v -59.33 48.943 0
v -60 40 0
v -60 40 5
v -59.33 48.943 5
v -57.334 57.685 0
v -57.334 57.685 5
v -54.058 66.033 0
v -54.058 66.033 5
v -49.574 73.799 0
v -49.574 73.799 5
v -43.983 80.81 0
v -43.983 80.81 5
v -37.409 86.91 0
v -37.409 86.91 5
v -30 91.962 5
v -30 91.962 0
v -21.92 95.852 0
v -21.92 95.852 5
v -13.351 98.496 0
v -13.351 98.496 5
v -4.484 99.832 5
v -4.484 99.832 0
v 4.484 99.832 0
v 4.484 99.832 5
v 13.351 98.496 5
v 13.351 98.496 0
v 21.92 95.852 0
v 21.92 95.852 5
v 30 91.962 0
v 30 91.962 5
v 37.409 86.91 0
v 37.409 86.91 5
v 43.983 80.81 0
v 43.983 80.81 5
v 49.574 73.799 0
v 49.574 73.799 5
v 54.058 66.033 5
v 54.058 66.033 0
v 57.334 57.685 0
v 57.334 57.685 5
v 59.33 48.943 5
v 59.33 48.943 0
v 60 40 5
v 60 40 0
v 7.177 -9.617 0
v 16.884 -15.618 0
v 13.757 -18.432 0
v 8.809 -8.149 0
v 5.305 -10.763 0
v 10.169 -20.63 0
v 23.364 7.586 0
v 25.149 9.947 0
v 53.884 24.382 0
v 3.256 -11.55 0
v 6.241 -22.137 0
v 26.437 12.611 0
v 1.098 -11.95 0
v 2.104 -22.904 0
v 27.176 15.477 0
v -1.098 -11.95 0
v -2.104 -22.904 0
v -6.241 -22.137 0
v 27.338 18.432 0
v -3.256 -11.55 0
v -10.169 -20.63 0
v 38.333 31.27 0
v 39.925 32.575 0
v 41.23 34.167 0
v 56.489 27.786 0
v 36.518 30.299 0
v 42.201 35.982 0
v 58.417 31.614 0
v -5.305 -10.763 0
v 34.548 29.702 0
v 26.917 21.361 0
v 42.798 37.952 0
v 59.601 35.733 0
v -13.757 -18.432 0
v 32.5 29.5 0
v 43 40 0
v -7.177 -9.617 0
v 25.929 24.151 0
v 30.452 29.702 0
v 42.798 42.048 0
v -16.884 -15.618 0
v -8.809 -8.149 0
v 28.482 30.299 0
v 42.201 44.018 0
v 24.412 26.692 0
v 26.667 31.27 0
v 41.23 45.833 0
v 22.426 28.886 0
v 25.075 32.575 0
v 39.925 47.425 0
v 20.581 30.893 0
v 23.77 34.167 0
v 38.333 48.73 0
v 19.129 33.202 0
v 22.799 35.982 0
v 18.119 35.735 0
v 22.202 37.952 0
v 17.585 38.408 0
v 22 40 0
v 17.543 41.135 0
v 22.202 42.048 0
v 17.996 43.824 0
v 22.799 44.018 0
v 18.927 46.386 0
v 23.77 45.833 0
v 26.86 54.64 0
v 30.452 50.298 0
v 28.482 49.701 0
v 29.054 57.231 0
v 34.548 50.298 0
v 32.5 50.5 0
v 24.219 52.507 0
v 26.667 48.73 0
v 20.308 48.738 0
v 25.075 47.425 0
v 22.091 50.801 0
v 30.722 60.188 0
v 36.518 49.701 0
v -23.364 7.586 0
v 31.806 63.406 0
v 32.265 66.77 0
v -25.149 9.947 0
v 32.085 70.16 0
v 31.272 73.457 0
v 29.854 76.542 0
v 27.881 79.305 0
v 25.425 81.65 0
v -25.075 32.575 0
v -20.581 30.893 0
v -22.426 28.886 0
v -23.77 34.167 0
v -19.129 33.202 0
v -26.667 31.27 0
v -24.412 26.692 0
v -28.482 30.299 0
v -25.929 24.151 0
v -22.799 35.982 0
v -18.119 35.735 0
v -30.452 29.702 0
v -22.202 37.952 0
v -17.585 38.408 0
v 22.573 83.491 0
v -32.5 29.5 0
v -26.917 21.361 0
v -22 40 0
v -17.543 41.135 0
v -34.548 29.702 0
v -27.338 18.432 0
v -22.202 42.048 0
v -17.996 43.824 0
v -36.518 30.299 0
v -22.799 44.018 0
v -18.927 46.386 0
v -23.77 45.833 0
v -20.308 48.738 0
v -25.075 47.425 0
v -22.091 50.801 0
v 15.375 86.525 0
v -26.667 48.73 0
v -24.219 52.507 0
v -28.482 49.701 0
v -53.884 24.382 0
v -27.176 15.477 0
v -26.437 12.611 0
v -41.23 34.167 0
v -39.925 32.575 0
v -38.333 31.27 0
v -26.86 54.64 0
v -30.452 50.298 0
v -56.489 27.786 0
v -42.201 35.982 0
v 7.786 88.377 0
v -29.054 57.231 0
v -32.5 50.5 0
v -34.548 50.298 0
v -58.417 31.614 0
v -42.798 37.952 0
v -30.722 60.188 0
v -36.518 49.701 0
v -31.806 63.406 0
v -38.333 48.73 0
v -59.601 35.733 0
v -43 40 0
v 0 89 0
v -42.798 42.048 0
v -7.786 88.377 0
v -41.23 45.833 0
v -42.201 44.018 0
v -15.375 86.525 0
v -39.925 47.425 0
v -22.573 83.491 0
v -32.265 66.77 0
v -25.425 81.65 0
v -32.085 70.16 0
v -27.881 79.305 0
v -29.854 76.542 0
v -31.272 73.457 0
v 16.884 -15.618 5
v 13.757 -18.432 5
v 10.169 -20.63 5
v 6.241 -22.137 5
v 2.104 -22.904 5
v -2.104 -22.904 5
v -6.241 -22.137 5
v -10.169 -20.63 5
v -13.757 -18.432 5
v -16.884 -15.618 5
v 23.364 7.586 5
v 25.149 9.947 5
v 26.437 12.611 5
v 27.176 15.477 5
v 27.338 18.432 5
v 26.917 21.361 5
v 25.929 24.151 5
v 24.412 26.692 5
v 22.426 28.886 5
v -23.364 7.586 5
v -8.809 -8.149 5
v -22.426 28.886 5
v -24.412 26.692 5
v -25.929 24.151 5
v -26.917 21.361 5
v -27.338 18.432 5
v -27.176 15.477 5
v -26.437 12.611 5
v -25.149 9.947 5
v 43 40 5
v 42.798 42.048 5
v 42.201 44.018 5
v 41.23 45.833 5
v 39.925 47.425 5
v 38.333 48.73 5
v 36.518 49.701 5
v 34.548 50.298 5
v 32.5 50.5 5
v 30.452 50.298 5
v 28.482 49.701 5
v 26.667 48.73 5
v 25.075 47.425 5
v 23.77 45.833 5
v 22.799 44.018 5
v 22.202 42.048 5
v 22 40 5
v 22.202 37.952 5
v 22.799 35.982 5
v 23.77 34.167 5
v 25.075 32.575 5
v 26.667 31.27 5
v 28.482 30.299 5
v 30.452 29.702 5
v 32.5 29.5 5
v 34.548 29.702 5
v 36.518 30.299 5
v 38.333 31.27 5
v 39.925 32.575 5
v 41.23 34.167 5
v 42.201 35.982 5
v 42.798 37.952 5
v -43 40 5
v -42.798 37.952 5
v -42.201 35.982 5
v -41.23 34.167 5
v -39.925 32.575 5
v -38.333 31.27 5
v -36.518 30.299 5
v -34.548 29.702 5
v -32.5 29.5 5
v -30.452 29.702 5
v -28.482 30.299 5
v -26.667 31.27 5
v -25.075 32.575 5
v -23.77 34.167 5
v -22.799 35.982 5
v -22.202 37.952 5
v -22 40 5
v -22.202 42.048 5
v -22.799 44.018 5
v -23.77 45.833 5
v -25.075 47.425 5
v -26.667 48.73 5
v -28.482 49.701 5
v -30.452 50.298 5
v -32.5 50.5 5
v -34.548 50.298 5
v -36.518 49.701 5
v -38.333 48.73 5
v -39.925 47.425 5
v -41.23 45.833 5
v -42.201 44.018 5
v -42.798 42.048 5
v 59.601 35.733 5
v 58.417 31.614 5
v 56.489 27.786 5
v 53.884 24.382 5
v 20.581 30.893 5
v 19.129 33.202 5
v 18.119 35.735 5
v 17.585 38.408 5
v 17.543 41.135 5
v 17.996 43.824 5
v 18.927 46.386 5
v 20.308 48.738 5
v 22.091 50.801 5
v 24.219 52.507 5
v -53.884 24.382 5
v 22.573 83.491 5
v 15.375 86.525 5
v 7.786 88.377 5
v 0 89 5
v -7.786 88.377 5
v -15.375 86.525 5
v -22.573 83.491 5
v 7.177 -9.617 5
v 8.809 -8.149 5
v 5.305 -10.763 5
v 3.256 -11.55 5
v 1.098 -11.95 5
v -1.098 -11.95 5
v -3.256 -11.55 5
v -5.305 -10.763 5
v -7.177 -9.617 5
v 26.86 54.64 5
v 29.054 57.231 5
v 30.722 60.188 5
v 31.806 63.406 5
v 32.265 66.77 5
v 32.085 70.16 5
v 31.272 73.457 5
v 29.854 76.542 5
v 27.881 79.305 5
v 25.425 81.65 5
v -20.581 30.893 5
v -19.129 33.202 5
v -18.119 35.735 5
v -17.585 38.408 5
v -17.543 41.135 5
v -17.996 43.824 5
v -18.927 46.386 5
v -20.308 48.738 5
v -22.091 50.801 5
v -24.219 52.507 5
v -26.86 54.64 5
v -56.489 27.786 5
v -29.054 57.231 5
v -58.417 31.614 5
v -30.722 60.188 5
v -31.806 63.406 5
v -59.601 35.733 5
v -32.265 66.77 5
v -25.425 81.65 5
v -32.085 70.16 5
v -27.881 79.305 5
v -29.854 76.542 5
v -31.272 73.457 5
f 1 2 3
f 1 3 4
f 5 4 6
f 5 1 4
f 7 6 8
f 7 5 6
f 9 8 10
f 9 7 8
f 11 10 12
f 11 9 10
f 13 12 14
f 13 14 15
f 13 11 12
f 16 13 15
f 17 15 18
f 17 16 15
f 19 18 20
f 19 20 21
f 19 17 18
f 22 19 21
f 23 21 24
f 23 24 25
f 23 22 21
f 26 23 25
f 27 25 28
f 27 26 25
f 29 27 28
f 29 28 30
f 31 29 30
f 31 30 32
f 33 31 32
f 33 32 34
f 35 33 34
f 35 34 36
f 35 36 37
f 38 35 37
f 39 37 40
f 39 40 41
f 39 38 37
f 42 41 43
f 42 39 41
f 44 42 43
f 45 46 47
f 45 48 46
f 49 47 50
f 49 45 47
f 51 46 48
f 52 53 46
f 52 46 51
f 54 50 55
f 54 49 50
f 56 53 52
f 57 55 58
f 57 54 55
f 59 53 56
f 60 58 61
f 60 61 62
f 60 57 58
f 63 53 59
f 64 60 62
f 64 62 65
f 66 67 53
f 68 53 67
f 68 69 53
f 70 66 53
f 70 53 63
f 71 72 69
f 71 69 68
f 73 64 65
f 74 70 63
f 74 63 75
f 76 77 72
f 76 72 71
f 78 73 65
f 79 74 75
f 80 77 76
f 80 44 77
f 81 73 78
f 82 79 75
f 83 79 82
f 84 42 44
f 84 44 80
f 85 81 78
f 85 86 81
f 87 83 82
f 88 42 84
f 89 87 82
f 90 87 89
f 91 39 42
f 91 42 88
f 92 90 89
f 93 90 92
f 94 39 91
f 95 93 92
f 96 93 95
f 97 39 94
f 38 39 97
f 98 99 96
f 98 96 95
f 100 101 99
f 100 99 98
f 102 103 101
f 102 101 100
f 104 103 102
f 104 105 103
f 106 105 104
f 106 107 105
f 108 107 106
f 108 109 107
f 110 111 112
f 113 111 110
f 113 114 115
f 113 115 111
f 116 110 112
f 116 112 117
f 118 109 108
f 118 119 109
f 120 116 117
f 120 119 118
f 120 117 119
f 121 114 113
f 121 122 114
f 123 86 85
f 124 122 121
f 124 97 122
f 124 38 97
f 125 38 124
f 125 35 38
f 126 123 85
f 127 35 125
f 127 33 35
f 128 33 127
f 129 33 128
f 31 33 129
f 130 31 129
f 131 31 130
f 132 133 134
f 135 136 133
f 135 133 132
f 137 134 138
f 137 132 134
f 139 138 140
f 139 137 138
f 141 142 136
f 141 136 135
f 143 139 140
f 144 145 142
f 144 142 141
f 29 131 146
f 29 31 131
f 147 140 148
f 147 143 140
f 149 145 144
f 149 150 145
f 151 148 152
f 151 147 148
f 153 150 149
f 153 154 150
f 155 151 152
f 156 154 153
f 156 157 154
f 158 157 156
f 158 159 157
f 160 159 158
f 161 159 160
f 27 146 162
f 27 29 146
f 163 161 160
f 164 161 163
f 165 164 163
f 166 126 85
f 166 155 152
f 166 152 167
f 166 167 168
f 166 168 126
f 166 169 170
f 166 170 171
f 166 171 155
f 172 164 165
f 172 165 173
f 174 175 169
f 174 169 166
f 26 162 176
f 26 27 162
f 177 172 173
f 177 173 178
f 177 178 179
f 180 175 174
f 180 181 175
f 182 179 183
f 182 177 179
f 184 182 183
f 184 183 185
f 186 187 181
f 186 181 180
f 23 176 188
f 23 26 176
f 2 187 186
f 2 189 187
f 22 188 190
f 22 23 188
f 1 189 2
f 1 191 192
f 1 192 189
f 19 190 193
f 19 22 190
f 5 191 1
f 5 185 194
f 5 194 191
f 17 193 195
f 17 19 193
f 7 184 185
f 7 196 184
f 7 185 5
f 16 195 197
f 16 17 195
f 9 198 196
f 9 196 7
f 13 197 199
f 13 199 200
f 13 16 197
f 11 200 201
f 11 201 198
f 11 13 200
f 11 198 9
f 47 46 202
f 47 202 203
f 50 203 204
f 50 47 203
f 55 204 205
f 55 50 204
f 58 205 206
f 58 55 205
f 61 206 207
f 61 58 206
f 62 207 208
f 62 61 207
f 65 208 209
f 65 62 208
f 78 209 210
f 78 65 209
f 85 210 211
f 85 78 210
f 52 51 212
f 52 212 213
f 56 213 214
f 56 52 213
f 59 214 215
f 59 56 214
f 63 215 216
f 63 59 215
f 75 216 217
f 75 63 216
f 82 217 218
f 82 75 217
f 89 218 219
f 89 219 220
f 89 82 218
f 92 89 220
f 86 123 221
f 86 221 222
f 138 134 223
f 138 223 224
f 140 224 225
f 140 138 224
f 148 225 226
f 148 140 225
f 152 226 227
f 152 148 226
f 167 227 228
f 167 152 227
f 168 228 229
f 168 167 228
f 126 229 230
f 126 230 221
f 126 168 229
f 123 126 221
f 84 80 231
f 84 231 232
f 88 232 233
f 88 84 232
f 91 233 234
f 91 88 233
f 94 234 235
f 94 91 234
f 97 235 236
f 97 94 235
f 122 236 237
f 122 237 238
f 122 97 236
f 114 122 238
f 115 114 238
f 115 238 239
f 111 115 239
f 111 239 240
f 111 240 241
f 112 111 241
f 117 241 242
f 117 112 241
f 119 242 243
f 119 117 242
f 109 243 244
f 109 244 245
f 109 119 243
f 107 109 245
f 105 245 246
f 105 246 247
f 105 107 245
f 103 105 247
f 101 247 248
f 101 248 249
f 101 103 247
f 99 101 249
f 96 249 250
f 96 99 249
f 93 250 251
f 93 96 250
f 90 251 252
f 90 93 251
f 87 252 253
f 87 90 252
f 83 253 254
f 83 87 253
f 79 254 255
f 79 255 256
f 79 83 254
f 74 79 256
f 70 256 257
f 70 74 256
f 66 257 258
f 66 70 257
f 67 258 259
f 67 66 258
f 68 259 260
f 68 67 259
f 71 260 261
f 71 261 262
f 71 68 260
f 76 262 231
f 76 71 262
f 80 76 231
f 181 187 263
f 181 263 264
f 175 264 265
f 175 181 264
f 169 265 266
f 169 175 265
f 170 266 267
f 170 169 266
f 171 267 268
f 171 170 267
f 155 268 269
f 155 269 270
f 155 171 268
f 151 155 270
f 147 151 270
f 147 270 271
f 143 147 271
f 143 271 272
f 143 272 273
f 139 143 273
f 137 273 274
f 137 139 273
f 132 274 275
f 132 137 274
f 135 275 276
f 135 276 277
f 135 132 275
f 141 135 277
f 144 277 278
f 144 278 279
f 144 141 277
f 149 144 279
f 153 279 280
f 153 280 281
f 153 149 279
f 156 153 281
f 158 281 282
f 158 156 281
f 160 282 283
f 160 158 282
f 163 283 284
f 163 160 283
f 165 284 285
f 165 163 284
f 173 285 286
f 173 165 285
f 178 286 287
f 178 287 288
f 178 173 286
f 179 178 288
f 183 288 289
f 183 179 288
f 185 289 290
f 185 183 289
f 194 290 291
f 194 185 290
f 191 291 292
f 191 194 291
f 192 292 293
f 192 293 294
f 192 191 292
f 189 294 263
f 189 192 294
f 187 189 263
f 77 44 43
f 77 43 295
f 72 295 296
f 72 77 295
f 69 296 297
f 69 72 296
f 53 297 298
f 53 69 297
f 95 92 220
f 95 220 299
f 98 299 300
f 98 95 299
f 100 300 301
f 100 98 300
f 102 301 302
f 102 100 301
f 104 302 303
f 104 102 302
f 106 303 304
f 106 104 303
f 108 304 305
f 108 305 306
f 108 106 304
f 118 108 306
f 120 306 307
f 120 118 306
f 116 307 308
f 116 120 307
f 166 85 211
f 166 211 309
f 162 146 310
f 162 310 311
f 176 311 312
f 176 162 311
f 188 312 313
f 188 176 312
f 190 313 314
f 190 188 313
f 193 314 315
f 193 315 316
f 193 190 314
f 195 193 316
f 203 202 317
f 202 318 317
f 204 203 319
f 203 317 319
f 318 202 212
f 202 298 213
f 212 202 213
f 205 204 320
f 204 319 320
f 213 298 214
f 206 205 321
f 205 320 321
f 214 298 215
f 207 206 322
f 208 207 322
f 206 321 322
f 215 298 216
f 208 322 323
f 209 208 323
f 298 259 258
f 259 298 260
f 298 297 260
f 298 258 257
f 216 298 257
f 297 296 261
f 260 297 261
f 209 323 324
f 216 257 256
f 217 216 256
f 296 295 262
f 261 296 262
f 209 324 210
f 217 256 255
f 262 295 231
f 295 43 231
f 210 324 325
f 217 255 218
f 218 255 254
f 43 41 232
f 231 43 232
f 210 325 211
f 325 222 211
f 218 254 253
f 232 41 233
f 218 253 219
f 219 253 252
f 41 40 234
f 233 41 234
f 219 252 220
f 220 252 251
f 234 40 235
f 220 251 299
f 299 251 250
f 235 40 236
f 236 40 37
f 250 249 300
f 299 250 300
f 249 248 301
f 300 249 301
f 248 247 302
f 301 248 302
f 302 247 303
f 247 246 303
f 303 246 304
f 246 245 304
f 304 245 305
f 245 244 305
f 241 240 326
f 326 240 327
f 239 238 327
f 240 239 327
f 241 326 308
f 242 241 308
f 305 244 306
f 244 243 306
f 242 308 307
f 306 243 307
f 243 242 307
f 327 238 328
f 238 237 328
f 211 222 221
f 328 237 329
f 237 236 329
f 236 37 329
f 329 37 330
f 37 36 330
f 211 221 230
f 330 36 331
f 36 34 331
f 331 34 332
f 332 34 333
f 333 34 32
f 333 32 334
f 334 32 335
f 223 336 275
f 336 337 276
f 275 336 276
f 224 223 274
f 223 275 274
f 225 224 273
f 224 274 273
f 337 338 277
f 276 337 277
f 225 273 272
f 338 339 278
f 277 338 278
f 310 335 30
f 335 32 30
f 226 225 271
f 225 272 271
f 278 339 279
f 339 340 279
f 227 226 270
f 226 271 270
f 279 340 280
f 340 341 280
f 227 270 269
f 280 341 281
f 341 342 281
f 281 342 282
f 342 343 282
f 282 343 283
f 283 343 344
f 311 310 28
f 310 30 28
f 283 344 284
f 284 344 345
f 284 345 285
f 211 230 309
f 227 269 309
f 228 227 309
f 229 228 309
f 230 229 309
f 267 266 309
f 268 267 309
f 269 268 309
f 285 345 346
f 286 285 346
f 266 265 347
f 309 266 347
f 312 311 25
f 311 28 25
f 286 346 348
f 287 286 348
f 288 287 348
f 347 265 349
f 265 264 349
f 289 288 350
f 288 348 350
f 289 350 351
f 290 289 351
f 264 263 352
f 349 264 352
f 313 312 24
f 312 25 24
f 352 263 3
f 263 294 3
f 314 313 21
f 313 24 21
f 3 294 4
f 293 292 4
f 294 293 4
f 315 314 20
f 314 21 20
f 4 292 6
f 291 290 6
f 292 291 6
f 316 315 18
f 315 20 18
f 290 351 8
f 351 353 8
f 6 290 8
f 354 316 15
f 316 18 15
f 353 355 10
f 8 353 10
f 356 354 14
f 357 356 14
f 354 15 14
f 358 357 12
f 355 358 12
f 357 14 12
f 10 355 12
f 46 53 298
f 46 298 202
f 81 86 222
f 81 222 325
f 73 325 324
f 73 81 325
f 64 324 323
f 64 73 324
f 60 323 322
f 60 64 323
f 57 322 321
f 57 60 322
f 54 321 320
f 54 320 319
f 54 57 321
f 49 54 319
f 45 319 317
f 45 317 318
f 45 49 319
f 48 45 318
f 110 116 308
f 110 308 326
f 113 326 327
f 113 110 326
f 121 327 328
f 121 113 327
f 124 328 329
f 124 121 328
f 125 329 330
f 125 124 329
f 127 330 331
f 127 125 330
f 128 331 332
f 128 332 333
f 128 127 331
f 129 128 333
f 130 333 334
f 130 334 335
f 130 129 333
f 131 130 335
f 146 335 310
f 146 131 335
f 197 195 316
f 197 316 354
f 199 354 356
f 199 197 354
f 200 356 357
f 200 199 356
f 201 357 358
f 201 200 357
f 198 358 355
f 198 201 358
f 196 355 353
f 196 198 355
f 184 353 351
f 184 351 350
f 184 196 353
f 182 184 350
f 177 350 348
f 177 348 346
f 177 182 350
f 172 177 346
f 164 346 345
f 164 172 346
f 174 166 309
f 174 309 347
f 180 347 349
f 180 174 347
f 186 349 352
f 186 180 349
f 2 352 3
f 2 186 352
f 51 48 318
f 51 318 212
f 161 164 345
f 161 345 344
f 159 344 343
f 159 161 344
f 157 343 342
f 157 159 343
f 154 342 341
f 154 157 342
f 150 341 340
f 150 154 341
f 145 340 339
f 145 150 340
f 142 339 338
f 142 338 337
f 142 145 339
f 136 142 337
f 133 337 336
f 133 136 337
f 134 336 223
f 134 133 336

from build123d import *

# Parameters (mm, degrees)
SKETCH2_R           = 10.5
BOSS_EXTRUDE1_DEPTH = 5


with BuildPart() as part:
    # Sketch2 → Boss-Extrude1 (new body)
    with BuildSketch(Plane.XY):
        with BuildLine():
            Line((53.88428711, 24.382034423), (16.88428711, -15.617965577))
            ThreePointArc((16.88428711, -15.617965577), (0, -23), (-16.88428711, -15.617965577))
            Line((-16.88428711, -15.617965577), (-53.88428711, 24.382034423))
            ThreePointArc((-53.88428711, 24.382034423), (-58.416566059, 31.613660022), (-60, 40))
            ThreePointArc((-60, 40), (0, 100), (60, 40))
            ThreePointArc((60, 40), (58.416566059, 31.613660022), (53.88428711, 24.382034423))
        make_face()
        with Locations((32.5, 40)):
            Circle(SKETCH2_R, mode=Mode.SUBTRACT)
        with Locations(Location((-32.5, 40, 0), (0, 0, 180))):
            Circle(SKETCH2_R, mode=Mode.SUBTRACT)
        with BuildLine():
            Line((8.809193275, -8.148503779), (23.364034903, 7.586460143))
            ThreePointArc((23.364034903, 7.586460143), (27.338026386, 18.431860253), (22.426271655, 28.886044933))
            ThreePointArc((22.426271655, 28.886044933), (17.542994151, 41.134890312), (24.218531469, 52.506689369))
            ThreePointArc((24.218531469, 52.506689369), (32.255432897, 68.469423949), (22.572828784, 83.491003675))
            ThreePointArc((22.572828784, 83.491003675), (0, 89), (-22.572828784, 83.491003675))
            ThreePointArc((-22.572828784, 83.491003675), (-32.255432897, 68.469423949), (-24.218531469, 52.506689369))
            ThreePointArc((-24.218531469, 52.506689369), (-17.542994151, 41.134890312), (-22.426271655, 28.886044933))
            ThreePointArc((-22.426271655, 28.886044933), (-27.338026386, 18.431860253), (-23.364034903, 7.586460143))
            Line((-23.364034903, 7.586460143), (-8.809193275, -8.148503779))
            ThreePointArc((-8.809193275, -8.148503779), (0, -12), (8.809193275, -8.148503779))
        make_face(mode=Mode.SUBTRACT)
    extrude(amount=BOSS_EXTRUDE1_DEPTH)


solid = part.part
